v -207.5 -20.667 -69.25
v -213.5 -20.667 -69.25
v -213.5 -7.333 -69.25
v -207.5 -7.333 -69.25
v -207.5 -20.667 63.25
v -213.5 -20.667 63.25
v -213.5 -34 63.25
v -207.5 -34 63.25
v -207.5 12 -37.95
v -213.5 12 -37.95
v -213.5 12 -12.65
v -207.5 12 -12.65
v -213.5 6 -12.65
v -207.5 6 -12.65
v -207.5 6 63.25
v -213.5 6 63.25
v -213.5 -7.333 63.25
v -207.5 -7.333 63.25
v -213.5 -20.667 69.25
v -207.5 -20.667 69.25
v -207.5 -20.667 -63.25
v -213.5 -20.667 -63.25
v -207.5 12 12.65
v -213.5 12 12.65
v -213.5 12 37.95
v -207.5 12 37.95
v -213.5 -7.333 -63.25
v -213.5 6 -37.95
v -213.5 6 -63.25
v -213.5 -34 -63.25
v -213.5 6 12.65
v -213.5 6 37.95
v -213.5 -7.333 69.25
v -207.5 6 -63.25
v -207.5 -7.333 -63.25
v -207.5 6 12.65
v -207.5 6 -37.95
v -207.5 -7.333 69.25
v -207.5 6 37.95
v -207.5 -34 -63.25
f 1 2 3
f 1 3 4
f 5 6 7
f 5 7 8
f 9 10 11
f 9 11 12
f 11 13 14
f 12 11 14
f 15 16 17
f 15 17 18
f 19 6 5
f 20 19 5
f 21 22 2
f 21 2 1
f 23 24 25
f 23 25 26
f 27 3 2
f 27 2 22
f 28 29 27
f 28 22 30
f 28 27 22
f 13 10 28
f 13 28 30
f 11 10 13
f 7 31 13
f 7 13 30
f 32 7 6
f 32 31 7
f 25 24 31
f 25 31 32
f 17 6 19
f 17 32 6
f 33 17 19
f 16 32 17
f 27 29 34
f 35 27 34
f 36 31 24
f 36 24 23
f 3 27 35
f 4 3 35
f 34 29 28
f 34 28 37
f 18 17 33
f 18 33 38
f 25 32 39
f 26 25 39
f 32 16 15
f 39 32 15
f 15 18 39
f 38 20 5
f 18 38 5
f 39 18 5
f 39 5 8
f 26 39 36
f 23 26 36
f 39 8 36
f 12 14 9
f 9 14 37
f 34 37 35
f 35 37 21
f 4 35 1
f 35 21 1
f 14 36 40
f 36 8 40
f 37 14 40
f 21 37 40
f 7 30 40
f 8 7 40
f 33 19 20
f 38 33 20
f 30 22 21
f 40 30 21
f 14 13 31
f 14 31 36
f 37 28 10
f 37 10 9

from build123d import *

# Parameters (mm, degrees)
SKETCH1_W               = 415
SKETCH1_H               = 126.5
BOSS_EXTRUDE1_DEPTH     = 6
SKETCH2_W               = 6
SKETCH2_H               = 25.3
BOSS_EXTRUDE2_DEPTH     = 40
SKETCH1_2_W             = 415
SKETCH1_2_H             = 126.5
CUT_EXTRUDE1_DEPTH      = 7
CUT_EXTRUDE1_DEPTH_BACK = 35
SKETCH2_4_W             = 6
SKETCH2_4_H             = 25.3
BOSS_EXTRUDE3_DEPTH     = 6
SKETCH6_W               = 6
SKETCH6_H               = 13.333333334
BOSS_EXTRUDE5_DEPTH     = 6


with BuildPart() as part:
    # Sketch1 → Boss-Extrude1 (new body)
    with BuildSketch(Plane(origin=(0, 0, 0), x_dir=(1, 0, 0), z_dir=(0, 1, 0))):
        Rectangle(SKETCH1_W, SKETCH1_H)
    extrude(amount=BOSS_EXTRUDE1_DEPTH)

    # Sketch2 → Boss-Extrude2 (add)
    with BuildSketch(Plane(origin=(0, 6, 0), x_dir=(1, 0, 0), z_dir=(0, 1, 0))):
        with Locations((-210.5, 50.6)):
            Rectangle(SKETCH2_W, SKETCH2_H)
        with Locations((-210.5, 25.3)):
            Rectangle(SKETCH2_W, SKETCH2_H)
        with Locations((-210.5, 0)):
            Rectangle(SKETCH2_W, SKETCH2_H)
        with Locations((-210.5, -25.3)):
            Rectangle(SKETCH2_W, SKETCH2_H)
        with Locations((-210.5, -50.6)):
            Rectangle(SKETCH2_W, SKETCH2_H)
    extrude(amount=-BOSS_EXTRUDE2_DEPTH)

    # Sketch1<2> → Cut-Extrude1 (cut, two sides)
    with BuildSketch(Plane(origin=(0, 0, 0), x_dir=(1, 0, 0), z_dir=(0, 1, 0))) as cut_extrude1_sk:
        Rectangle(SKETCH1_2_W, SKETCH1_2_H)
    extrude(amount=CUT_EXTRUDE1_DEPTH, mode=Mode.SUBTRACT)
    extrude(cut_extrude1_sk.sketch, amount=-CUT_EXTRUDE1_DEPTH_BACK, mode=Mode.SUBTRACT)

    # Sketch2<4> → Boss-Extrude3 (add)
    with BuildSketch(Plane(origin=(0, 6, 0), x_dir=(1, 0, 0), z_dir=(0, 1, 0))):
        with Locations((-210.5, -25.3)):
            Rectangle(SKETCH2_4_W, SKETCH2_4_H)
        with Locations((-210.5, 25.3)):
            Rectangle(SKETCH2_4_W, SKETCH2_4_H)
    extrude(amount=BOSS_EXTRUDE3_DEPTH)

    # Sketch6 → Boss-Extrude5 (add)
    with BuildSketch(Plane.XY.offset(63.25)):
        with Locations((-210.5, -14)):
            Rectangle(SKETCH6_W, SKETCH6_H)
    boss_extrude5 = extrude(amount=BOSS_EXTRUDE5_DEPTH)

    # Mirror4: Boss-Extrude5 across plane
    add(boss_extrude5.mirror(Plane.XY))


solid = part.part
